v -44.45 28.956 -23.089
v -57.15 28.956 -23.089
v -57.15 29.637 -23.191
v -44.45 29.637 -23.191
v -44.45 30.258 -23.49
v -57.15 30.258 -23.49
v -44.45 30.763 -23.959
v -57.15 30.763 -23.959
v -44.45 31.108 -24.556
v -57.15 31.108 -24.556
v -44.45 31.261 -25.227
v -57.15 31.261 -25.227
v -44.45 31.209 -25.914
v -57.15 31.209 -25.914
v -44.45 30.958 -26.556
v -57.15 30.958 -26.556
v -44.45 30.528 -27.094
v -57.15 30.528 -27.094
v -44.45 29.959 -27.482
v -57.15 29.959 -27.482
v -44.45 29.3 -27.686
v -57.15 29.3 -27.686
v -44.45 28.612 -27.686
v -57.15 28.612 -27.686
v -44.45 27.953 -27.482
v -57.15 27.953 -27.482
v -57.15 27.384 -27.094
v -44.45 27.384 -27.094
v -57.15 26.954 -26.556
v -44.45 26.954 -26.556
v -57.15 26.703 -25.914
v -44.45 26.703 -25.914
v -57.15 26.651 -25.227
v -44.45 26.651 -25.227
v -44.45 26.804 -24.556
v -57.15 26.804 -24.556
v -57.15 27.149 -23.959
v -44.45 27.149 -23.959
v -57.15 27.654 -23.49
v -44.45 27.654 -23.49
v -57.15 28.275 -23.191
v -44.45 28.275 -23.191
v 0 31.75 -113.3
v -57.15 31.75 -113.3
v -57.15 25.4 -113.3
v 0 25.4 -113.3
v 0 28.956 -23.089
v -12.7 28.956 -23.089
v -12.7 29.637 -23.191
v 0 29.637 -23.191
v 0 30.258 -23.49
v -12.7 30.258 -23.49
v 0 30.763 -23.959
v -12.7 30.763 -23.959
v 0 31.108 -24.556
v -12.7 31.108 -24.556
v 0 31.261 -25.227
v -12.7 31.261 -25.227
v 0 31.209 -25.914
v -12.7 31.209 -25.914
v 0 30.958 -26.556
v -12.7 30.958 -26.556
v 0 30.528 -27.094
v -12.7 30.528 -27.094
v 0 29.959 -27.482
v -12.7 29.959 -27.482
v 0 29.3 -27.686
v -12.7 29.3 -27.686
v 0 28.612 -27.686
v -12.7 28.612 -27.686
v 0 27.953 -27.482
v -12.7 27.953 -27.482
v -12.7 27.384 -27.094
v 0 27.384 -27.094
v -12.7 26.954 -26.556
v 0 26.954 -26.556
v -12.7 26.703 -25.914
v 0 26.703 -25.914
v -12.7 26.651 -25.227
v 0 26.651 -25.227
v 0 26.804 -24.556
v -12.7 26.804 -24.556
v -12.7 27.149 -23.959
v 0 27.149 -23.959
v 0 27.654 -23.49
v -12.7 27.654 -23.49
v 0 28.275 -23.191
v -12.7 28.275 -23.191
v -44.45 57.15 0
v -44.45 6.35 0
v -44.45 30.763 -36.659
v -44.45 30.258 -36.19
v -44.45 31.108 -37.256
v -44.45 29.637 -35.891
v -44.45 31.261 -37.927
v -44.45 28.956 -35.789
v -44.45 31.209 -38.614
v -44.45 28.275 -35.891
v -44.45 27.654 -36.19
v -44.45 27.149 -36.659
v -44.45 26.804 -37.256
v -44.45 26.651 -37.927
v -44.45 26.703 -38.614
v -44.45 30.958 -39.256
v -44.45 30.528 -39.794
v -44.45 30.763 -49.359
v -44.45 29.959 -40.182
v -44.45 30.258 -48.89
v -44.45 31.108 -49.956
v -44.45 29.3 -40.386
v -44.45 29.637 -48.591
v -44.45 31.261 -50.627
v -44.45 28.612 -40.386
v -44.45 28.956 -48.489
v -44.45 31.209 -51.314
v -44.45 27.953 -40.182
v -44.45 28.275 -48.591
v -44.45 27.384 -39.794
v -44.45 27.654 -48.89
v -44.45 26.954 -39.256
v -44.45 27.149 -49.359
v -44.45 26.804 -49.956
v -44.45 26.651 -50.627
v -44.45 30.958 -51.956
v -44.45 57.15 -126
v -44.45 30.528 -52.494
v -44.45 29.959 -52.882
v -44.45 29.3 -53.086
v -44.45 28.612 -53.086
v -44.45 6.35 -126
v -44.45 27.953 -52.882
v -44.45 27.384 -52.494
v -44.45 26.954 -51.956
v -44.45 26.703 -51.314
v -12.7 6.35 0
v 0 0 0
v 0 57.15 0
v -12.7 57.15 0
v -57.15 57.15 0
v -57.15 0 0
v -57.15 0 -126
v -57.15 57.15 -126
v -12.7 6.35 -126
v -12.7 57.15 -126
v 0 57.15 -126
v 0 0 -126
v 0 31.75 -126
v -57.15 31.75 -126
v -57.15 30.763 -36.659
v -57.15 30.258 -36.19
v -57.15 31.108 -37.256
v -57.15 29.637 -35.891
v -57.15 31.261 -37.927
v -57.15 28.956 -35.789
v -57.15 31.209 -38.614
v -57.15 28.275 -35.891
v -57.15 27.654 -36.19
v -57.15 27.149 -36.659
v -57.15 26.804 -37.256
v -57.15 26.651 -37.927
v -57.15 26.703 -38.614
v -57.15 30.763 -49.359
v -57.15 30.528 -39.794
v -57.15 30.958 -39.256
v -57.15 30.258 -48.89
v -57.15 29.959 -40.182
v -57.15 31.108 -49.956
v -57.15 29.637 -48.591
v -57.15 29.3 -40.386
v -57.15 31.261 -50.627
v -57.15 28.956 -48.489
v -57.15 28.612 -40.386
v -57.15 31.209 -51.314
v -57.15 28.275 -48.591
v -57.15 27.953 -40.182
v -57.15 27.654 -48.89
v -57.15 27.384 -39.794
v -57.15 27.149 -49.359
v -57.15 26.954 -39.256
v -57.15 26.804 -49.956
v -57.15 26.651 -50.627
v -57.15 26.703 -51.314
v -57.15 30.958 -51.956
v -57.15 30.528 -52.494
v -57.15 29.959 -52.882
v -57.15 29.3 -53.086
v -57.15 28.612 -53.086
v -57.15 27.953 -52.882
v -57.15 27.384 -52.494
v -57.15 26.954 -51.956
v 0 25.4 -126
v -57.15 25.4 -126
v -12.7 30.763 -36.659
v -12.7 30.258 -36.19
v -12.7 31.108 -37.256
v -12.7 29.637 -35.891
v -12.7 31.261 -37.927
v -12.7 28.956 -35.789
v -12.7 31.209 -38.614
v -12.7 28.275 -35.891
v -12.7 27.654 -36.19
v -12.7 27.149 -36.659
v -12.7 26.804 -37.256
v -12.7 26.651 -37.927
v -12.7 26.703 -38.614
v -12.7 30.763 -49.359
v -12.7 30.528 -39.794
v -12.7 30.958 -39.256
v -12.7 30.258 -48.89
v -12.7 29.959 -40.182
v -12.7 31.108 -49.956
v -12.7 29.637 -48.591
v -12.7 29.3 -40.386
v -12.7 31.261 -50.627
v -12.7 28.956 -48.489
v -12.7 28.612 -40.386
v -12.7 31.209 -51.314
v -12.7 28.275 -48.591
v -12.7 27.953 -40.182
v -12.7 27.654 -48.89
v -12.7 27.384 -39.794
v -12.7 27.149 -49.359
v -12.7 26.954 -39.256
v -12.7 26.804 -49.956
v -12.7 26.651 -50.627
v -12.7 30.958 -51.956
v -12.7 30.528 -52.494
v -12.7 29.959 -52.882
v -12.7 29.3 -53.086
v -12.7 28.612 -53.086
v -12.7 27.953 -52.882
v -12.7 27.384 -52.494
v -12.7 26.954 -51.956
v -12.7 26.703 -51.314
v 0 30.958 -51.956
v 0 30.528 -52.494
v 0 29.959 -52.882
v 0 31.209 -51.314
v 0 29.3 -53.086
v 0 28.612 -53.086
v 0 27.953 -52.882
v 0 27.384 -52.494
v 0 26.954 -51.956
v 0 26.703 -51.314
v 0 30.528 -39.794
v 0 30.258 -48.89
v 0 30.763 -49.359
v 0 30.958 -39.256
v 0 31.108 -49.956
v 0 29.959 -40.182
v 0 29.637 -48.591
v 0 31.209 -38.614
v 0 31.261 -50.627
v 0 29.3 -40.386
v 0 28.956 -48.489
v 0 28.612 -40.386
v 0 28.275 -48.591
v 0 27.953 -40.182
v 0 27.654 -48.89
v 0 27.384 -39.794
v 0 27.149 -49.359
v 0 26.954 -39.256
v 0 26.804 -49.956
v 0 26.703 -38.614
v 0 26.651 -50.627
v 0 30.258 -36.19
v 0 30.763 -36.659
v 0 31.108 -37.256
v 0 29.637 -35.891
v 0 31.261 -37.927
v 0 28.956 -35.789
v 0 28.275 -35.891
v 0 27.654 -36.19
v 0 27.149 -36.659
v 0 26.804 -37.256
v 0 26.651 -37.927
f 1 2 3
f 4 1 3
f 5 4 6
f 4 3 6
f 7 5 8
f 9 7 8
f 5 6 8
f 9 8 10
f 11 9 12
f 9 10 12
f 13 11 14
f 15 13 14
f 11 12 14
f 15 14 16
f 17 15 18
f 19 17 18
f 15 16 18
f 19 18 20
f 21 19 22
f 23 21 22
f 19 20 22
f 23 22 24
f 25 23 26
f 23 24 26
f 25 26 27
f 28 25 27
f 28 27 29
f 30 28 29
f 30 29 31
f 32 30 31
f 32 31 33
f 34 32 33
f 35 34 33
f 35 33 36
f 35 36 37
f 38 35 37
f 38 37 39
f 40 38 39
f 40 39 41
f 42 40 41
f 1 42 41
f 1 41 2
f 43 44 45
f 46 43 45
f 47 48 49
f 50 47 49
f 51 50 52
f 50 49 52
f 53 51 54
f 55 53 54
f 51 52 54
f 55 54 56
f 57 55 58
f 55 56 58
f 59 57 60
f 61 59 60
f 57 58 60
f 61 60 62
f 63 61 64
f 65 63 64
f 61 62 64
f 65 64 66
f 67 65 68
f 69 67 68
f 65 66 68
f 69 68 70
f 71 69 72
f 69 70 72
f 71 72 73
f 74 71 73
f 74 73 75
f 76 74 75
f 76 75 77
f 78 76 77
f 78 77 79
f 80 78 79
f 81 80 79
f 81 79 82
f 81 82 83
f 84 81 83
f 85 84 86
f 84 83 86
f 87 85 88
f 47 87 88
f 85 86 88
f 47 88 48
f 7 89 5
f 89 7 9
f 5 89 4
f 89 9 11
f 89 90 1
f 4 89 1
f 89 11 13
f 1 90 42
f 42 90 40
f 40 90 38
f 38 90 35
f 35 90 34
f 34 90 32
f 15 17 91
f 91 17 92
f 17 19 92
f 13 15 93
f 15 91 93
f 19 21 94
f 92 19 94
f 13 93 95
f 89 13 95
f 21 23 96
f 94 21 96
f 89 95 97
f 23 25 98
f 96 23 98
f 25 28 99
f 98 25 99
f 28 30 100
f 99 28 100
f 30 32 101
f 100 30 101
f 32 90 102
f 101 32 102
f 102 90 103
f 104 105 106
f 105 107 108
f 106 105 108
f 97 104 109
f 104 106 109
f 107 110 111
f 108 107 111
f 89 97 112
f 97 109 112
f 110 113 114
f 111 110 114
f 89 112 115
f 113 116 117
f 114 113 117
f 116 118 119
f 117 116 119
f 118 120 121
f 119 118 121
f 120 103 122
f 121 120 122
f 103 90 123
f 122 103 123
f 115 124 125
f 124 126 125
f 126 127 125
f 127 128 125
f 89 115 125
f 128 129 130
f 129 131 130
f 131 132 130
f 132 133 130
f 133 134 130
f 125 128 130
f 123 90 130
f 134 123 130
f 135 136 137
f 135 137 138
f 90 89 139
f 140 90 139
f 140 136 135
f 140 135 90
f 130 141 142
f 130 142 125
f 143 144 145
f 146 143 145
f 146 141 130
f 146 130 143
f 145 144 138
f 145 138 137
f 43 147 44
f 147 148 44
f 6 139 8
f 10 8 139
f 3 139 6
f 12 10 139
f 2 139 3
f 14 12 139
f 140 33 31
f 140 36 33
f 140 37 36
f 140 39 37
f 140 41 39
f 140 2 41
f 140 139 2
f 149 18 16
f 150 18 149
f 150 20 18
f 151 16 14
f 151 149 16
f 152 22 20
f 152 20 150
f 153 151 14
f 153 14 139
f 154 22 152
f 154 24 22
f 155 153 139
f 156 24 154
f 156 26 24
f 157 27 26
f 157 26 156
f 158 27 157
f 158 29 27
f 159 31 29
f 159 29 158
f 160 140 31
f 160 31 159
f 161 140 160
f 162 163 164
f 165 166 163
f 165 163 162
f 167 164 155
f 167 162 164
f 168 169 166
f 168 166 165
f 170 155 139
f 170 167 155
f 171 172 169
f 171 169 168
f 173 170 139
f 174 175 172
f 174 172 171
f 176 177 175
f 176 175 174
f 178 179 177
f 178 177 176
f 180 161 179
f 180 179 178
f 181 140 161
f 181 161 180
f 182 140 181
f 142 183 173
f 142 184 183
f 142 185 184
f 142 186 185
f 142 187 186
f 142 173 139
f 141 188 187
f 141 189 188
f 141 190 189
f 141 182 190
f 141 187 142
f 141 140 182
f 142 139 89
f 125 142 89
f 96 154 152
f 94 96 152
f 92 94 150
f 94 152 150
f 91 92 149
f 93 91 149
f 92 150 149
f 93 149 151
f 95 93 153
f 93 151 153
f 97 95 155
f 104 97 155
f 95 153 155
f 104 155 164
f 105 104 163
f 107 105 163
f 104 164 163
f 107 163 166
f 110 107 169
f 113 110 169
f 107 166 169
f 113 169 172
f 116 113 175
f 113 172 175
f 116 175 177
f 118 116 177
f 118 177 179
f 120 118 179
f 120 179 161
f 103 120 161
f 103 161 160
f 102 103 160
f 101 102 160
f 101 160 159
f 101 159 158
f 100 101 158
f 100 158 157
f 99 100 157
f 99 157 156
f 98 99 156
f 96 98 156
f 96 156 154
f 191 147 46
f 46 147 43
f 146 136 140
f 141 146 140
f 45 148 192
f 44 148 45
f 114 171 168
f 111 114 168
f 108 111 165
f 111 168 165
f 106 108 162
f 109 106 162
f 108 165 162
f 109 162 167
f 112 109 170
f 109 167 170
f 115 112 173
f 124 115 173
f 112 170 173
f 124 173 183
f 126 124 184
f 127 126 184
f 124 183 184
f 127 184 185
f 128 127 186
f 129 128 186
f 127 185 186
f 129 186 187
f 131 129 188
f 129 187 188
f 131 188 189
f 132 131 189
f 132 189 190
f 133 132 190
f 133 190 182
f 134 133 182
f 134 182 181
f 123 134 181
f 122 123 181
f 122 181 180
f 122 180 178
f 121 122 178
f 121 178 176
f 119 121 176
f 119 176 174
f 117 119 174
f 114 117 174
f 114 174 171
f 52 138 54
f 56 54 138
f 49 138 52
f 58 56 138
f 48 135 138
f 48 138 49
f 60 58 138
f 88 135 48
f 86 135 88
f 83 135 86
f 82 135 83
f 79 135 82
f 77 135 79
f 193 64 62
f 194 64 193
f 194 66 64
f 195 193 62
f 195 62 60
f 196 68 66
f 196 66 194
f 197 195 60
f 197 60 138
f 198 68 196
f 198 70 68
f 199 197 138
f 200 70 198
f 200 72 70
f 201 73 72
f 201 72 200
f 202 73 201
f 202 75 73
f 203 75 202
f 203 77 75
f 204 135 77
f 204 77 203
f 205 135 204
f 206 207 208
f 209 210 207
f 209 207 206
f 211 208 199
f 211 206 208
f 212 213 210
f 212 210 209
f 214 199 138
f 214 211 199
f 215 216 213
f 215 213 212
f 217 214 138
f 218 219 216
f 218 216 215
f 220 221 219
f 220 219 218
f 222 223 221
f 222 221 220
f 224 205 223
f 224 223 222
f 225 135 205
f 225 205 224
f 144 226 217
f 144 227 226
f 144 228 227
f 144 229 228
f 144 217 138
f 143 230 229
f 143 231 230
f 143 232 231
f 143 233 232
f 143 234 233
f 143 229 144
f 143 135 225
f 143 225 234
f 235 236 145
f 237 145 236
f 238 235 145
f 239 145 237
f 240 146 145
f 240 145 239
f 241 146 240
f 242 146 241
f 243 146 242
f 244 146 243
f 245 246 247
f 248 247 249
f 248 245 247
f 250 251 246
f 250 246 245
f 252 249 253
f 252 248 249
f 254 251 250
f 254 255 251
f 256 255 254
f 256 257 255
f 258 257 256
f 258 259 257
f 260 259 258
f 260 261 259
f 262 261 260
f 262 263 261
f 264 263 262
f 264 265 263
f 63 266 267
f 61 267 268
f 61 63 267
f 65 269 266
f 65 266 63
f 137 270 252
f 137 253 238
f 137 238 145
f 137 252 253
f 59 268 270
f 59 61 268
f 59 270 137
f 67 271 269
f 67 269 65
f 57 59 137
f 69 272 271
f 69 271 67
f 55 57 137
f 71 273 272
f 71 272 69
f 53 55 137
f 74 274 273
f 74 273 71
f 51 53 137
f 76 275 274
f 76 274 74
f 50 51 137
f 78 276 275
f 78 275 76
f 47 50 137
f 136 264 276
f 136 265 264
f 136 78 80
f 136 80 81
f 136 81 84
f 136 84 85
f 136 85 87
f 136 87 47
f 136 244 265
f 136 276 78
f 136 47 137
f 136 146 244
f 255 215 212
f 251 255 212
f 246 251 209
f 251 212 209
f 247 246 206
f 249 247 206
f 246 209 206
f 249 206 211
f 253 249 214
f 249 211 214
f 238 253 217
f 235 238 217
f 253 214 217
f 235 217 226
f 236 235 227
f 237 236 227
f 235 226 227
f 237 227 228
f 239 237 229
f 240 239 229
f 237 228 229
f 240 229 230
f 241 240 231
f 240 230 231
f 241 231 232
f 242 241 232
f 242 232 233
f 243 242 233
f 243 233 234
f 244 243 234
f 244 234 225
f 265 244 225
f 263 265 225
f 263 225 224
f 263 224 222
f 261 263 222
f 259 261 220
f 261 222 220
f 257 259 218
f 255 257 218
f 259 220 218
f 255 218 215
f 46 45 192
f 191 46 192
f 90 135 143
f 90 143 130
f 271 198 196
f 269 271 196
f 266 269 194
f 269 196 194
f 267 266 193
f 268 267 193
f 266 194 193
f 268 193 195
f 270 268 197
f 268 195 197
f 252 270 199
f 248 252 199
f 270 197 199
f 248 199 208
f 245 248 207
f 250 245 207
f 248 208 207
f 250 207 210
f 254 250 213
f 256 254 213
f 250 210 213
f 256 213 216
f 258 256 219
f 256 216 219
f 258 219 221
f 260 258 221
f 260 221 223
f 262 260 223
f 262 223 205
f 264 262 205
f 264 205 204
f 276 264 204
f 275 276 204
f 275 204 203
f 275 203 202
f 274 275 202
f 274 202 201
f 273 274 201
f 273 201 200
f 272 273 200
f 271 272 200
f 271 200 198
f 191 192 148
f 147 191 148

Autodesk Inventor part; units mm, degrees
ref_plane "YZ Plane" through (0, 0, 0) normal (1, 0, 0) x (0, 1, 0)
ref_plane "XZ Plane" through (0, 0, 0) normal (0, 1, 0) x (-1, 0, 0)
ref_plane "XY Plane" through (0, 0, 0) normal (0, 0, 1) x (1, 0, 0)
sketch "Sketch1" plane through (0, 0, 0) normal (0, 1, 0) x (-1, 0, 0)
  line L0 (0, 0) -> (57.15, 0)
  line L1 (57.15, 0) -> (57.15, -126)
  line L2 (57.15, -126) -> (0, -126)
  line L3 (0, -126) -> (0, 0)
  dimension "d0" = 57.15
  dimension "d1" = 126
extrude "Extrusion1" add sketch "Sketch1" along normal blind 6.35
sketch "Sketch2" plane through (0, 6.35, 0) normal (0, 1, 0) x (1, 0, 0)
  line L0 (-57.15, 0) -> (0, 0) projected
  line L1 (0, 126) -> (-57.15, 126) projected
  line L2 (-57.15, 0) -> (-44.45, 0)
  line L3 (-44.45, 0) -> (-44.45, 126)
  line L4 (-44.45, 126) -> (-57.15, 126)
  line L5 (-57.15, 126) -> (-57.15, 0)
  line L6 (0, 0) -> (-12.7, 0)
  line L7 (-12.7, 0) -> (-12.7, 126)
  line L8 (-12.7, 126) -> (0, 126)
  line L9 (0, 126) -> (0, 0)
  dimension "d4" = 12.7
  dimension "d5" = 12.7
extrude "Extrusion2" add sketch "Sketch2" along normal blind 50.8 contours L5 L1 L3 L0 | L7 L1 L9 L0
sketch "Sketch3" plane through (-57.15, 0, -126) normal (-1, 0, 0) x (0, 0, 1)
  line L0 (0, 6.35) -> (126, 6.35) construction
  line L1 (0, 0) -> (126, 0) construction
  line L2 (126, 0) -> (126, 6.35) construction
  line L3 (126, 6.35) -> (0, 6.35) construction
  line L4 (0, 6.35) -> (0, 0) construction
  line L5 (-0.0082, 18.796) -> (126.0082, 18.796) construction
  circle A0 centre (100.6, 28.956) radius 10.16 construction
  circle A1 centre (87.9, 28.956) radius 2.3114
  circle A2 centre (75.2, 28.956) radius 2.3114
  circle A3 centre (100.6, 28.956) radius 2.3114
  line L6 (126, 0) -> (126, 57.15) projected
  dimension "d8" = 12.446
  dimension "d9" = 20.32
  dimension "d10" = 4.6228
  dimension "d11" = 12.7
  dimension "d12" = 12.7
  dimension "d14" = 25.4
extrude "Extrusion3" cut sketch "Sketch3" against normal through all
sketch "Sketch4" plane through (-57.15, 0, -126) normal (-1, 0, 0) x (0, 0, 1)
  line L0 (0, 0) -> (126, 0) projected
  line L1 (0, 6.35) -> (126, 6.35) projected
  line L2 (0, 0) -> (126, 0)
  line L3 (126, 0) -> (126, 6.35)
  line L4 (126, 6.35) -> (0, 6.35)
  line L5 (0, 6.35) -> (0, 0)
  line L6 (0, 0) -> (0, 57.15) projected
  line L7 (0, 18.796) -> (126, 18.796) construction
  line L8 (0, 31.75) -> (12.7, 31.75)
  line L9 (12.7, 31.75) -> (12.7, 25.4)
  line L10 (12.7, 25.4) -> (0, 25.4)
  line L11 (0, 25.4) -> (0, 31.75)
  point P0 (0, 25.4)
  dimension "d17" = 12.446
  dimension "d18" = 12.7
  dimension "d19" = 6.35
  dimension "d21" = 19.05
extrude "Extrusion4" add sketch "Sketch4" against normal through all separate body contours L6 L8 L9 L10
properties part number "case" material "ABS Plastic"
